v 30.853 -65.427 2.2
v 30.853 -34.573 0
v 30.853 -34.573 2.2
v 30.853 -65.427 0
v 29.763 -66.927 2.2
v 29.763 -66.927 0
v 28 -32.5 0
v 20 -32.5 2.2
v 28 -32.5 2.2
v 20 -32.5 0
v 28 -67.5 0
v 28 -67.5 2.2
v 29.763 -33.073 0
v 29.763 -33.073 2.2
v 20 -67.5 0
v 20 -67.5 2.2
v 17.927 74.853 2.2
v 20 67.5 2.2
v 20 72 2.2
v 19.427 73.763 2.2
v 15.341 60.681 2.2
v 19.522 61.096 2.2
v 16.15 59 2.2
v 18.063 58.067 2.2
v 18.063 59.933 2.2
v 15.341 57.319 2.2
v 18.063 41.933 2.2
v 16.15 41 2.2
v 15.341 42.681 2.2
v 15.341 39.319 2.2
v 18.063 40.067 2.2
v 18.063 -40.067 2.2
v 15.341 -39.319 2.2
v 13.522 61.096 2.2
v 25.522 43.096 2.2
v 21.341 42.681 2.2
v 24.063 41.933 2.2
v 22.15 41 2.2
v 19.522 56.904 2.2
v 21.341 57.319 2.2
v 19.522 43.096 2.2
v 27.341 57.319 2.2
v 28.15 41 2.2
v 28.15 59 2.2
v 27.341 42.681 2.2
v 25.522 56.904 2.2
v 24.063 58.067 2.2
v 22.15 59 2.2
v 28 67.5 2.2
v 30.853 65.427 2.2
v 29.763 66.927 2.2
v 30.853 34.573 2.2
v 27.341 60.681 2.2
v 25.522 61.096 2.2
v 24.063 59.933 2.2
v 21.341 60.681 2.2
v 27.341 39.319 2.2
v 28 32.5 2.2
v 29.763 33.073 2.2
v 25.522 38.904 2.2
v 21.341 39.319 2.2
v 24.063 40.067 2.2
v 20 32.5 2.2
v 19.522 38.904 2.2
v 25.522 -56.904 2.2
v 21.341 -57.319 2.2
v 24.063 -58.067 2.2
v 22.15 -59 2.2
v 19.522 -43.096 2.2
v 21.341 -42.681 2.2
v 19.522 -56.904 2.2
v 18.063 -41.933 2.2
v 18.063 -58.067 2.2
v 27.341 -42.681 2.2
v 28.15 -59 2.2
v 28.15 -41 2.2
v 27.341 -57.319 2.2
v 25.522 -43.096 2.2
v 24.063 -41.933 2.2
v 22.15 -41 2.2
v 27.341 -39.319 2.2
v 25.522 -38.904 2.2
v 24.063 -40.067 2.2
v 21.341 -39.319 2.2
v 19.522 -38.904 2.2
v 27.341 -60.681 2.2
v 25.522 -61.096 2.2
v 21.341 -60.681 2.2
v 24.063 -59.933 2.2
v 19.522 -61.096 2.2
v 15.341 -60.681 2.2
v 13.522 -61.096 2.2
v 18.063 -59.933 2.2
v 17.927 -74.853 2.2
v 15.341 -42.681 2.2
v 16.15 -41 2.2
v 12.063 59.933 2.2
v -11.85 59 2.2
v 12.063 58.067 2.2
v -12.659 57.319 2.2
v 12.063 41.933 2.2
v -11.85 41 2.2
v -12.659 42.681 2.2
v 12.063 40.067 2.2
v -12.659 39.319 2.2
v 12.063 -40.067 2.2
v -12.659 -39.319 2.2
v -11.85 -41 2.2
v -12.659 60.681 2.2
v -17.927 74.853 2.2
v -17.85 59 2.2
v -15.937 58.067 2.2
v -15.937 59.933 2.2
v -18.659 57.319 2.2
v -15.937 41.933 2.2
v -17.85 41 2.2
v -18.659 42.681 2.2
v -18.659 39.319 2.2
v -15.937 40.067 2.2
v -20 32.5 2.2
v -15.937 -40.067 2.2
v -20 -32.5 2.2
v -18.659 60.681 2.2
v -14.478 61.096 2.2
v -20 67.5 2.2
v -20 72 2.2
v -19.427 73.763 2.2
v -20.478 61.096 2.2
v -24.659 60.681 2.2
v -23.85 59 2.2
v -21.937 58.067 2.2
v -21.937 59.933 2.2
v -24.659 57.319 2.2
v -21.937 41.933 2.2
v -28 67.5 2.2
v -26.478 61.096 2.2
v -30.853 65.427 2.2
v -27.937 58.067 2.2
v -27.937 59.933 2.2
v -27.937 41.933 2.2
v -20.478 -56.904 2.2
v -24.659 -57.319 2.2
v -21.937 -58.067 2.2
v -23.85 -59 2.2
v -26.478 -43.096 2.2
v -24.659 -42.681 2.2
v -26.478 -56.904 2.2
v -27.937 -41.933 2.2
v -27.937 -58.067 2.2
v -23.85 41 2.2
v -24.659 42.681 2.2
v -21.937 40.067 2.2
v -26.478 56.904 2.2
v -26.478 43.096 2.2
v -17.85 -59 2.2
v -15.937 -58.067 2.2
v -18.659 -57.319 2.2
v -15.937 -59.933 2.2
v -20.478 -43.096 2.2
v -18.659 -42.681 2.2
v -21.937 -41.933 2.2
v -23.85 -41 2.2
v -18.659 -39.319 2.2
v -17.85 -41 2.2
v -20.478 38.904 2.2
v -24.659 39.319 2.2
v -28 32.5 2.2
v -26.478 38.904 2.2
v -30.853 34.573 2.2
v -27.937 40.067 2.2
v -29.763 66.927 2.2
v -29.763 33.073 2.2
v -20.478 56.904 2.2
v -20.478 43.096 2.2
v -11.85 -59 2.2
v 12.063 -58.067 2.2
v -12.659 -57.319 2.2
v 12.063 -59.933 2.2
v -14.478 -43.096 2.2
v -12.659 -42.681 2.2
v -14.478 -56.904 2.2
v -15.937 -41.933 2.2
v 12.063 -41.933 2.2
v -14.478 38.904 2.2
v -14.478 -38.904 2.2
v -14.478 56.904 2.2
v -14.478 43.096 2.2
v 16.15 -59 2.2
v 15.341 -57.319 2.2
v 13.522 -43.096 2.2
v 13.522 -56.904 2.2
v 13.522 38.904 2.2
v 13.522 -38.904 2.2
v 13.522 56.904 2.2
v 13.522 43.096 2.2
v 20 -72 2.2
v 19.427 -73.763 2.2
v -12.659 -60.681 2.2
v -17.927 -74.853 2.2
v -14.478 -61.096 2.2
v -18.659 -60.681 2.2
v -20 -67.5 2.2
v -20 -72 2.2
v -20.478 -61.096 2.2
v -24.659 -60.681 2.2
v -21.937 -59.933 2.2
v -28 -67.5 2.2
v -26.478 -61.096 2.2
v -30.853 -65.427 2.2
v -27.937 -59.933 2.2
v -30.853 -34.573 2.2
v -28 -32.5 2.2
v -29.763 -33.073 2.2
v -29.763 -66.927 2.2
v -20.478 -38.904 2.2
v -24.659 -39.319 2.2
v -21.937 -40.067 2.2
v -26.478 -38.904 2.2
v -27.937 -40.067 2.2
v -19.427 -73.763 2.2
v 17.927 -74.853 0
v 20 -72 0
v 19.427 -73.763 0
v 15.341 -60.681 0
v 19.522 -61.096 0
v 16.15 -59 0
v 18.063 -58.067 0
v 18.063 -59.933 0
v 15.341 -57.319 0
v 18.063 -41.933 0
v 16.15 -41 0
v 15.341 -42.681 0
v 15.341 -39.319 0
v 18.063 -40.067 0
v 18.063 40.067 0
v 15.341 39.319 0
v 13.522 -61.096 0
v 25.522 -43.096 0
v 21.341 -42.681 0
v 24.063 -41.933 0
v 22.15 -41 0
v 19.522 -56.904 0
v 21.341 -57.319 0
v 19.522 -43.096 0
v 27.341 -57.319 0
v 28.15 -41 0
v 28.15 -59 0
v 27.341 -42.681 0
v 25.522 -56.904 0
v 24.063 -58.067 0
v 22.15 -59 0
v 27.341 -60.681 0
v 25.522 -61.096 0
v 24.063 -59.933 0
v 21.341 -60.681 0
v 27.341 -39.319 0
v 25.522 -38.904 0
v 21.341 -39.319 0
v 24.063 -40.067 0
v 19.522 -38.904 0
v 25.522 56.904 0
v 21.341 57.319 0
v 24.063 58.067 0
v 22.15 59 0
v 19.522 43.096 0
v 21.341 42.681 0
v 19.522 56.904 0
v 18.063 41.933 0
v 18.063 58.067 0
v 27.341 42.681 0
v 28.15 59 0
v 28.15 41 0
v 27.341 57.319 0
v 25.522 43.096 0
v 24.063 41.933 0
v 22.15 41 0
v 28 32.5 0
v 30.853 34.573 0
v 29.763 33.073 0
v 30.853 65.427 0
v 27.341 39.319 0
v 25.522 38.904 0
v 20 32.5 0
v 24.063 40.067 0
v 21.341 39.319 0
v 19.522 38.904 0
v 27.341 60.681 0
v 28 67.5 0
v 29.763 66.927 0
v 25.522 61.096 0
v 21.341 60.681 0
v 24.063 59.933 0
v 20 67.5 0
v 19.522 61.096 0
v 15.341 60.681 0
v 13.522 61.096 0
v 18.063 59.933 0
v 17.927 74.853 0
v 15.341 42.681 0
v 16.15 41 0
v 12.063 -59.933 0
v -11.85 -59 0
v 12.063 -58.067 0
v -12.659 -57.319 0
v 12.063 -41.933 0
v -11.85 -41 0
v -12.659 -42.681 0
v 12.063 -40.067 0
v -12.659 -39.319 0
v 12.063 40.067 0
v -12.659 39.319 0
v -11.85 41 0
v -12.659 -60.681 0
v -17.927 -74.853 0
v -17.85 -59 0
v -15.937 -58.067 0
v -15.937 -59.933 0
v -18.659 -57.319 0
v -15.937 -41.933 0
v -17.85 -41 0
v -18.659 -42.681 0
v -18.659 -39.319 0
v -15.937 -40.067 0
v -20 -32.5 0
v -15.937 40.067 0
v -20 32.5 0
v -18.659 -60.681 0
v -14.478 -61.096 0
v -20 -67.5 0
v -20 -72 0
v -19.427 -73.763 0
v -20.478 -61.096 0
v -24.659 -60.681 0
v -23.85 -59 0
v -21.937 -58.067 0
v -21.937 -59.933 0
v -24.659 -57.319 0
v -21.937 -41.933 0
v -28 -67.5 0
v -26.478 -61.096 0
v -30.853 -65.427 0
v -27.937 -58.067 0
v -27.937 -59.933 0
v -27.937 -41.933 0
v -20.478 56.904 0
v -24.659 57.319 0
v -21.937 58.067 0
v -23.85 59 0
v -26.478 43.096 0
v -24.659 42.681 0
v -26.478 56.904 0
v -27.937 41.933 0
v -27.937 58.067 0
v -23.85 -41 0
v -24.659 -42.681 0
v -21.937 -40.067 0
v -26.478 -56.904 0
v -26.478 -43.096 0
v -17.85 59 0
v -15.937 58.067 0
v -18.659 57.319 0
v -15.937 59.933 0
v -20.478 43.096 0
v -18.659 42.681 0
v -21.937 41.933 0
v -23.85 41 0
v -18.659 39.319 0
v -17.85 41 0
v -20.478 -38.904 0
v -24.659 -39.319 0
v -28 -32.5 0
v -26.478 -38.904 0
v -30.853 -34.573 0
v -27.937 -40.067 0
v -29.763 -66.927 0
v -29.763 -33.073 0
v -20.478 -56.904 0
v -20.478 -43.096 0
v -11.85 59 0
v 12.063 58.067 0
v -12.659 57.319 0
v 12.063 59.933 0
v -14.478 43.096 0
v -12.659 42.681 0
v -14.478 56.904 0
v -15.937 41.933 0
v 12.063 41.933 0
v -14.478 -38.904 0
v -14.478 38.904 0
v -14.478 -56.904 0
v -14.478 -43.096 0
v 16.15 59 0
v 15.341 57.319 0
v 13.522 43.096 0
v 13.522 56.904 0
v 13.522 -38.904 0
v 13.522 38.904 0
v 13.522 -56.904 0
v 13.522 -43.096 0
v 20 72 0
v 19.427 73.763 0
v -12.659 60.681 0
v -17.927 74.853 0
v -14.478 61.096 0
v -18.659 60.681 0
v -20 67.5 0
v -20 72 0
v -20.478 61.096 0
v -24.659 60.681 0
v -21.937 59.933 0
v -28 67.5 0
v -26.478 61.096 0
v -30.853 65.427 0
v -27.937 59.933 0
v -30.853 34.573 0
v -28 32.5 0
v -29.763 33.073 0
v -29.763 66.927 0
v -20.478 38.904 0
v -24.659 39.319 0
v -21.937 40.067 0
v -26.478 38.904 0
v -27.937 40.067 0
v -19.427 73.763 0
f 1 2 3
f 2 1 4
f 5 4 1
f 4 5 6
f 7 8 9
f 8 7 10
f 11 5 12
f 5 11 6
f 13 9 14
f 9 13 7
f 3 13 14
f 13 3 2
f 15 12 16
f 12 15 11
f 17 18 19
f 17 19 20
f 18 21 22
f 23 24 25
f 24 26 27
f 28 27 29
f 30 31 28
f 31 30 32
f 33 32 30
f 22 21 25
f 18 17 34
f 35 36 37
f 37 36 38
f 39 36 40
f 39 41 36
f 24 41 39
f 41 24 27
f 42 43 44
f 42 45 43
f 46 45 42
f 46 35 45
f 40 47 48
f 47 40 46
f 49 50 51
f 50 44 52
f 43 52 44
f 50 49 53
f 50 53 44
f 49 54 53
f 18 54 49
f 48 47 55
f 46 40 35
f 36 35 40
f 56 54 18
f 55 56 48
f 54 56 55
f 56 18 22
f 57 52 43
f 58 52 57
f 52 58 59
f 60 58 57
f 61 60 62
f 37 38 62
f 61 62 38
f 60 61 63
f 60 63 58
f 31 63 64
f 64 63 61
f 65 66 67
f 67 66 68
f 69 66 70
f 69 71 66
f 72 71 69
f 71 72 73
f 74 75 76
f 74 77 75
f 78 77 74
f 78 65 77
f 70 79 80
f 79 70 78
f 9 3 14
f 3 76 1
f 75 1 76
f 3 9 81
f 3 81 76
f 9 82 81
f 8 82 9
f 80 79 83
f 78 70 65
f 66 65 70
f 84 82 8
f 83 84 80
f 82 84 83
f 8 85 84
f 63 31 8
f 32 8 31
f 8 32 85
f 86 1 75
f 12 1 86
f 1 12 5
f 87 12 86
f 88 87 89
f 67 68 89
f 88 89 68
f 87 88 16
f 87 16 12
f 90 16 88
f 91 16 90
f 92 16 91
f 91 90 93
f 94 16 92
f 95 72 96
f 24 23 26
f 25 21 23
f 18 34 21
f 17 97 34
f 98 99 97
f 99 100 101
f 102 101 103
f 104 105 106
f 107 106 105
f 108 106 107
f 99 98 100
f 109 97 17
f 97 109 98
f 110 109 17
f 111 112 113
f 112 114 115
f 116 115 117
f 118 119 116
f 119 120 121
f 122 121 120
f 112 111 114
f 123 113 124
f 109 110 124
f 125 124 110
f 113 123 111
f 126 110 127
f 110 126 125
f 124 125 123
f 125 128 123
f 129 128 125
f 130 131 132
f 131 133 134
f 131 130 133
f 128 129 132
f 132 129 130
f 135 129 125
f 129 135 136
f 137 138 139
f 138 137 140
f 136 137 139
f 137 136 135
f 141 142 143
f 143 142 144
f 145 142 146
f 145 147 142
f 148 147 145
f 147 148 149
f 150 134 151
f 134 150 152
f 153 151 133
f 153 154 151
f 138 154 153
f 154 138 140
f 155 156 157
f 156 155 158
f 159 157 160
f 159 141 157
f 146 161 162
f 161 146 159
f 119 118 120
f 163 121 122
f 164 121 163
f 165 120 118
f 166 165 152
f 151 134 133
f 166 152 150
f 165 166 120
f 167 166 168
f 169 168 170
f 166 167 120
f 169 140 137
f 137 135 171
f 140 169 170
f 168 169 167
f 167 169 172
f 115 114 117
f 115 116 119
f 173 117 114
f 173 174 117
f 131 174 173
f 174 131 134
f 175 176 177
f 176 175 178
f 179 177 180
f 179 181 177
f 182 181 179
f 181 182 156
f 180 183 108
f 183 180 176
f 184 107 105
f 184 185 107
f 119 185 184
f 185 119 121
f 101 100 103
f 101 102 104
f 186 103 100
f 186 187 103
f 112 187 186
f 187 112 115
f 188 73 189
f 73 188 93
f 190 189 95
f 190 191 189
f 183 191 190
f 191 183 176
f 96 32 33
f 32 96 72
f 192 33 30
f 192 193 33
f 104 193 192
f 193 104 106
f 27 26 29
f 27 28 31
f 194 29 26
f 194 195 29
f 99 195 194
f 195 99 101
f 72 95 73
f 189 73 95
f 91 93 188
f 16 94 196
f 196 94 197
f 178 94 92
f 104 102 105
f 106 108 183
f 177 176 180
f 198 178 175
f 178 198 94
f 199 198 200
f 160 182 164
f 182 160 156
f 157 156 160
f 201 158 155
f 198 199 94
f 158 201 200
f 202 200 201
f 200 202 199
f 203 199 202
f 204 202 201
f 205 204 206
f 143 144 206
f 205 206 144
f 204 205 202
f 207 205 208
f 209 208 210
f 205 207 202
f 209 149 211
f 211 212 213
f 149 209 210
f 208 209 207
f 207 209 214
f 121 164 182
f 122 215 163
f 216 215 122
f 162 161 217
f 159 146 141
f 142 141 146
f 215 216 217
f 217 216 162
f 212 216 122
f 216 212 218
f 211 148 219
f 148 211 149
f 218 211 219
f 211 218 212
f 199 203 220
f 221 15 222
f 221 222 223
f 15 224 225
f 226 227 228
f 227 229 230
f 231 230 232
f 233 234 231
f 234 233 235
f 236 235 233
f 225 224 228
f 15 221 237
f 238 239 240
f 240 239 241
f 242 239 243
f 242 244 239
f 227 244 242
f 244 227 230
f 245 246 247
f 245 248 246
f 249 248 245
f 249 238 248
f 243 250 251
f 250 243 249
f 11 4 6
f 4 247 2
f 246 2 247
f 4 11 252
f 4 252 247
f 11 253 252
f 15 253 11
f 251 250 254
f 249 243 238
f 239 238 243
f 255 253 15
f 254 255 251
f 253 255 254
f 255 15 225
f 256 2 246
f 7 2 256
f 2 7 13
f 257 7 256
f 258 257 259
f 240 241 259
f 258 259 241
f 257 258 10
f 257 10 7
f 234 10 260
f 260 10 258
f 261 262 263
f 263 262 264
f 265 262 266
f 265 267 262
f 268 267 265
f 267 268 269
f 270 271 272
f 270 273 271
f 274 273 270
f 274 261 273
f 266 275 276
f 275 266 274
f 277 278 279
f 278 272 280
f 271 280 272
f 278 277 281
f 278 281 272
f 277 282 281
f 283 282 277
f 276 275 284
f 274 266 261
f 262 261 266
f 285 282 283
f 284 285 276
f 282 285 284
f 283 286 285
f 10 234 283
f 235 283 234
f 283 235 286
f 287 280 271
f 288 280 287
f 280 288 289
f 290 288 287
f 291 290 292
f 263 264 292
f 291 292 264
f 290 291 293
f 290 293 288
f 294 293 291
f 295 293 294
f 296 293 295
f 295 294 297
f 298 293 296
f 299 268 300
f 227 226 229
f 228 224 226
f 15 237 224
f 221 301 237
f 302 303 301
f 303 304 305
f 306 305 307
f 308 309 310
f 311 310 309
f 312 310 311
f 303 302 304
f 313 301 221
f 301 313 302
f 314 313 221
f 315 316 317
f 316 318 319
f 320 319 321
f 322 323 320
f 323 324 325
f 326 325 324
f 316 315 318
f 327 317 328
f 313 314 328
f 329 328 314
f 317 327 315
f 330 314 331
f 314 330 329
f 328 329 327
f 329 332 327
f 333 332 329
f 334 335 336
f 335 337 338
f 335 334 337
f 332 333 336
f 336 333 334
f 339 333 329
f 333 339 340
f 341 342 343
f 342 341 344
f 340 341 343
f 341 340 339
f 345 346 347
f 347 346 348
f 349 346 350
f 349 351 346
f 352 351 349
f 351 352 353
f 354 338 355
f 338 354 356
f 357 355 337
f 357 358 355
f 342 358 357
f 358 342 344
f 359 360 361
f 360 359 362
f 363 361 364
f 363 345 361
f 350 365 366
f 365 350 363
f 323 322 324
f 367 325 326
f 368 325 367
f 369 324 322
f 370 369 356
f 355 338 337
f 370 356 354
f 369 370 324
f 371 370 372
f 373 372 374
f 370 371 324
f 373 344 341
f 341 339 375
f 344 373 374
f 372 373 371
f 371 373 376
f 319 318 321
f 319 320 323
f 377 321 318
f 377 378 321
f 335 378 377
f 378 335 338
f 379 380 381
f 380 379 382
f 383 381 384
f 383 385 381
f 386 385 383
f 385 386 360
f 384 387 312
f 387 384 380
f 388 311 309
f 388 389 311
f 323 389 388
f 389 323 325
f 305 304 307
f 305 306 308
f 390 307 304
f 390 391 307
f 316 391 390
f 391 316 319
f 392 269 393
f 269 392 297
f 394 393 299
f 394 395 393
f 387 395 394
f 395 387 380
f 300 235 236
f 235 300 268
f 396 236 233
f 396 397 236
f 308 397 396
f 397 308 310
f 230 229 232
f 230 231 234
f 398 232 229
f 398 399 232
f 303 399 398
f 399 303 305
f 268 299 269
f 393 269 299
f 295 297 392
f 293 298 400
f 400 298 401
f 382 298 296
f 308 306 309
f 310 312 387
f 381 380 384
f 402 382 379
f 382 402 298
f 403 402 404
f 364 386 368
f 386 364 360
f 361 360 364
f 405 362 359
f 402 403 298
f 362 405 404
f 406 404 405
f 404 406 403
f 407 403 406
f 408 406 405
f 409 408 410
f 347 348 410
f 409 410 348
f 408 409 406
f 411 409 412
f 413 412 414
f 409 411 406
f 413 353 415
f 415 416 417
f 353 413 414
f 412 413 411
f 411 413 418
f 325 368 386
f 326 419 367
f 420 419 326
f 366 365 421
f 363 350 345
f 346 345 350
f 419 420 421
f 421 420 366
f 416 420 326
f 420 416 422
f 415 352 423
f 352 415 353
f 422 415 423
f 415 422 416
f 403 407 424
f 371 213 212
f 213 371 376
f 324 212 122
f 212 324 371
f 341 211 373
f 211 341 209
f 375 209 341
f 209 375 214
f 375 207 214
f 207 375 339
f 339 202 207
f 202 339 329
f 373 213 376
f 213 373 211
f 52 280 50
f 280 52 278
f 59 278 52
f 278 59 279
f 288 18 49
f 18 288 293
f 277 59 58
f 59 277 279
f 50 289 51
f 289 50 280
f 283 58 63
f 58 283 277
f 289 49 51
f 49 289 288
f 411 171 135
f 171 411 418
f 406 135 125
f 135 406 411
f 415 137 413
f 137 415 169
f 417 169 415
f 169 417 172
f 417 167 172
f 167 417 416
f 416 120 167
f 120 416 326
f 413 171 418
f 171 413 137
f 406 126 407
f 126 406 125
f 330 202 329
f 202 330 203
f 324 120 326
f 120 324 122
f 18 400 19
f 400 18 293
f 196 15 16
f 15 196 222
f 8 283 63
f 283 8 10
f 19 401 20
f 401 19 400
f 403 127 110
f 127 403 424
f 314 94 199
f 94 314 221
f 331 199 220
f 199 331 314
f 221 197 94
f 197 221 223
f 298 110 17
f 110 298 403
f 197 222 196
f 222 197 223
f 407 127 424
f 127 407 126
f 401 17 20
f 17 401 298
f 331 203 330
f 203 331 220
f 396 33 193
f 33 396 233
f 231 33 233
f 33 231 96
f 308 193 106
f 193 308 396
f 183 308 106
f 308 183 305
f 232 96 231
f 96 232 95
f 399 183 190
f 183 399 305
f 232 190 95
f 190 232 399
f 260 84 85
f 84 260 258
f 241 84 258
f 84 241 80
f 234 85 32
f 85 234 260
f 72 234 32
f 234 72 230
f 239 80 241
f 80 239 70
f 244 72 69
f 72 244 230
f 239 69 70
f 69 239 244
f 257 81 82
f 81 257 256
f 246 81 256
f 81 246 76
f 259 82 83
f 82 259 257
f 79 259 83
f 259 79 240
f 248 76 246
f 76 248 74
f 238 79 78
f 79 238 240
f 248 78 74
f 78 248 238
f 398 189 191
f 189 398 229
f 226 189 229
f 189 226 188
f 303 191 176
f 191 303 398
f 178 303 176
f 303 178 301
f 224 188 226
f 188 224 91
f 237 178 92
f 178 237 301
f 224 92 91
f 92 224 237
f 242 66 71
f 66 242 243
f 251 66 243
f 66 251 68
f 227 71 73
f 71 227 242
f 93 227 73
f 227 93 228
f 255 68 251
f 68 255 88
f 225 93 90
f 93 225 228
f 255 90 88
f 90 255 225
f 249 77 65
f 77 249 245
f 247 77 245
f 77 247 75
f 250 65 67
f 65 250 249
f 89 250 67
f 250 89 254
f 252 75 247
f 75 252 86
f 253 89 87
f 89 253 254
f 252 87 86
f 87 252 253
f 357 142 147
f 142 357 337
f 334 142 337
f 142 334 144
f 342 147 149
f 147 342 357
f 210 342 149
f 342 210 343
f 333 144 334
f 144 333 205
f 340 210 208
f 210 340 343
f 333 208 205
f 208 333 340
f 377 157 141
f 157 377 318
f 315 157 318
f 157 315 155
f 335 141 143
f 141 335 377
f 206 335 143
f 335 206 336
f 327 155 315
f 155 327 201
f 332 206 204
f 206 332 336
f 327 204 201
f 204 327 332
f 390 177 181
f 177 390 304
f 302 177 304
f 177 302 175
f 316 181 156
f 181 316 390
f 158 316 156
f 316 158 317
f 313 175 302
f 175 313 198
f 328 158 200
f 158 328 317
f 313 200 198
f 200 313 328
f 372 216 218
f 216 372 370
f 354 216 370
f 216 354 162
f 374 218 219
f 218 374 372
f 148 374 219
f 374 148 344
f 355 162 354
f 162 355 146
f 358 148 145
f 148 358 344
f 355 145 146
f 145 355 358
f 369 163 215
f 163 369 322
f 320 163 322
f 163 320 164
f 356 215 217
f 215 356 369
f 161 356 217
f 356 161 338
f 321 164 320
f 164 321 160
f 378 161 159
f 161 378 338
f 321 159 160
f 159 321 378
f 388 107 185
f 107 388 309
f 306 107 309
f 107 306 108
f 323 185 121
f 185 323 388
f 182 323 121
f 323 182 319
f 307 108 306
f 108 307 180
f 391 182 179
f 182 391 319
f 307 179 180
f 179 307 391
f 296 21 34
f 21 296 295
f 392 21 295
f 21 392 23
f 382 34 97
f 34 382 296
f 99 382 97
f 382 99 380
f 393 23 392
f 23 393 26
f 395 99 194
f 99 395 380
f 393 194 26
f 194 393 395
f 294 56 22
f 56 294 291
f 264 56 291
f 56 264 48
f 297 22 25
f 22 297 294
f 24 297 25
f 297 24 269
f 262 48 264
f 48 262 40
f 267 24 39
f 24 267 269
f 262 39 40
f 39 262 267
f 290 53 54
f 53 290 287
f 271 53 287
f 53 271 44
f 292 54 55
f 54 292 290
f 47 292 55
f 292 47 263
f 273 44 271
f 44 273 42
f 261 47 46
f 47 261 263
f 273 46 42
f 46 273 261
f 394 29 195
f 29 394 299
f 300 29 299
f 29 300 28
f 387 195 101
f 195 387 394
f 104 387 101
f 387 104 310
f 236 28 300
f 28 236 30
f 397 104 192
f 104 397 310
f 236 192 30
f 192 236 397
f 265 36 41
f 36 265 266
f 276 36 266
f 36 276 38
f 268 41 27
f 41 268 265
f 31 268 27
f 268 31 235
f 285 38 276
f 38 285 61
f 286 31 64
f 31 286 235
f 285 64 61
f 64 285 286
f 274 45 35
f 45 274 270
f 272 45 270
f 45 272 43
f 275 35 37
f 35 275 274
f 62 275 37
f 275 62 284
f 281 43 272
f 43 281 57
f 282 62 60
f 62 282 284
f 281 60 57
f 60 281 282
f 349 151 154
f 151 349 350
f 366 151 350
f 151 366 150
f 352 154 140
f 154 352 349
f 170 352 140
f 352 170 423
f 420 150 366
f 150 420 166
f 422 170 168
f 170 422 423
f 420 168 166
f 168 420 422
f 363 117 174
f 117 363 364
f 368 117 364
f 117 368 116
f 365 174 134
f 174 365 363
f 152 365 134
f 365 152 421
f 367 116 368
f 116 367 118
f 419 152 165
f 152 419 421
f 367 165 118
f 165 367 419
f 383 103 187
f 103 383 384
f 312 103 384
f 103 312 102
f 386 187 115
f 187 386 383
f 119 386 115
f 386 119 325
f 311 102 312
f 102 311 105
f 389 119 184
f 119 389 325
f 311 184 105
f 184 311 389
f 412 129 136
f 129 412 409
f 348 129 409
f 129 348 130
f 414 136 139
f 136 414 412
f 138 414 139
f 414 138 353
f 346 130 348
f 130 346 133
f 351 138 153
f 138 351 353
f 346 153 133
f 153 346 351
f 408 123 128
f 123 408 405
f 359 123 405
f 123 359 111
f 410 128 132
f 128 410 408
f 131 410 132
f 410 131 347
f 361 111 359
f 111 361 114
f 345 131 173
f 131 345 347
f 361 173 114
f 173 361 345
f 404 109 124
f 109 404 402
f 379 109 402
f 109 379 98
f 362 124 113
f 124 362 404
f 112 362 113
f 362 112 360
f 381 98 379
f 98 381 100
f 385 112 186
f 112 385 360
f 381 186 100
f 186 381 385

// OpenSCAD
// file: ../util/rounded.scad
Collisions=false;

// Do a rounded cube
module rounded(x=10, y=10, z=10, r=3, center=false) {
    if (Collisions) {
        translate([0,0,center?(z/2):0])
            cube([x,y,z], center=center);
    } else {
        if (center) {
            translate([-(x/2),-(y/2),0])
                rounded(x, y, z, r);
        } else {
            translate([r,r,0])
                minkowski() {
                    cube([x-2*r,y-2*r,z/2]);
                    cylinder(h=z/2, r=r);
                }
        }
    }
}
// file: ../models/ollo.scad
Collisions=false;

// Diameter of plastic ollo holes
OlloHoles = 4.3;

// Width of Ollo "real" plastic
OlloWidth = 3;

// Distance between two ollo holes
OlloSpacing = 6;

module rivet()
{
    //:BOM "Ollo rivet" 0.05 http://www.robotis-shop-en.com/?act=shop_en.goods_view&GS=1605
}

// Do an Ollo hole on the part
module olloHole(depth=2.2, rivet=true)
{
    if (!Collisions) {
        if (rivet) {
	    rivet();
        }
        translate([0,0,-0.1])
            cylinder(depth+0.2, OlloHoles/2, OlloHoles/2);
    }	    
}

// Do 3 ollo holes
module threeOllo(depth=2.2, rivets=true)
{
    for (xy=[[-OlloSpacing,0],[0,0],[OlloSpacing,0]]) {
        translate([xy[0], xy[1], 0])
            olloHole(depth, rivets);
    }
}

// Do a servo arm holes
module servoArm(depth=2.2, rivets=true)
{
    if (rivets) {
        for (i=[1:5]) {
	    rivet();
	}
    }
    threeOllo(depth, false);
    rotate([0,0,90])
        threeOllo(depth, false);
}
// main file
include <../models/ollo.scad>;
use <../util/rounded.scad>;

//:Part
module square_body_rot_plate(width=40, length=70, legs=4, legsSpacing=40, thickness=2.2)
{	
    legsDistance = ((legs/2)-1)*legsSpacing;
    difference() {
        union() {
            rounded(width, length, thickness, center=true);
            for (k=[1:legs/2]) {
                for (side=[1,-1]) {
                    translate([side*(width/2),
                            -legsDistance/2+(k-1)*legsSpacing,0])
                        rotate([0,0,90])
                        rounded(35,22,thickness,center=true);
                }
            }
        }
        for (k=[1:legs/2]) {
            for (side=[1,-1]) {
                translate([side*(width/2),
                        -legsDistance/2+(k-1)*legsSpacing
                        +3*side*OlloSpacing/2,0])
                    rotate([0,0,0]) {
			    translate([0,-3*side*OlloSpacing,0])
			    threeOllo();
                threeOllo();
		    }
            }
        }
    }
}

square_body_rot_plate(legsSpacing=100, length=150);
